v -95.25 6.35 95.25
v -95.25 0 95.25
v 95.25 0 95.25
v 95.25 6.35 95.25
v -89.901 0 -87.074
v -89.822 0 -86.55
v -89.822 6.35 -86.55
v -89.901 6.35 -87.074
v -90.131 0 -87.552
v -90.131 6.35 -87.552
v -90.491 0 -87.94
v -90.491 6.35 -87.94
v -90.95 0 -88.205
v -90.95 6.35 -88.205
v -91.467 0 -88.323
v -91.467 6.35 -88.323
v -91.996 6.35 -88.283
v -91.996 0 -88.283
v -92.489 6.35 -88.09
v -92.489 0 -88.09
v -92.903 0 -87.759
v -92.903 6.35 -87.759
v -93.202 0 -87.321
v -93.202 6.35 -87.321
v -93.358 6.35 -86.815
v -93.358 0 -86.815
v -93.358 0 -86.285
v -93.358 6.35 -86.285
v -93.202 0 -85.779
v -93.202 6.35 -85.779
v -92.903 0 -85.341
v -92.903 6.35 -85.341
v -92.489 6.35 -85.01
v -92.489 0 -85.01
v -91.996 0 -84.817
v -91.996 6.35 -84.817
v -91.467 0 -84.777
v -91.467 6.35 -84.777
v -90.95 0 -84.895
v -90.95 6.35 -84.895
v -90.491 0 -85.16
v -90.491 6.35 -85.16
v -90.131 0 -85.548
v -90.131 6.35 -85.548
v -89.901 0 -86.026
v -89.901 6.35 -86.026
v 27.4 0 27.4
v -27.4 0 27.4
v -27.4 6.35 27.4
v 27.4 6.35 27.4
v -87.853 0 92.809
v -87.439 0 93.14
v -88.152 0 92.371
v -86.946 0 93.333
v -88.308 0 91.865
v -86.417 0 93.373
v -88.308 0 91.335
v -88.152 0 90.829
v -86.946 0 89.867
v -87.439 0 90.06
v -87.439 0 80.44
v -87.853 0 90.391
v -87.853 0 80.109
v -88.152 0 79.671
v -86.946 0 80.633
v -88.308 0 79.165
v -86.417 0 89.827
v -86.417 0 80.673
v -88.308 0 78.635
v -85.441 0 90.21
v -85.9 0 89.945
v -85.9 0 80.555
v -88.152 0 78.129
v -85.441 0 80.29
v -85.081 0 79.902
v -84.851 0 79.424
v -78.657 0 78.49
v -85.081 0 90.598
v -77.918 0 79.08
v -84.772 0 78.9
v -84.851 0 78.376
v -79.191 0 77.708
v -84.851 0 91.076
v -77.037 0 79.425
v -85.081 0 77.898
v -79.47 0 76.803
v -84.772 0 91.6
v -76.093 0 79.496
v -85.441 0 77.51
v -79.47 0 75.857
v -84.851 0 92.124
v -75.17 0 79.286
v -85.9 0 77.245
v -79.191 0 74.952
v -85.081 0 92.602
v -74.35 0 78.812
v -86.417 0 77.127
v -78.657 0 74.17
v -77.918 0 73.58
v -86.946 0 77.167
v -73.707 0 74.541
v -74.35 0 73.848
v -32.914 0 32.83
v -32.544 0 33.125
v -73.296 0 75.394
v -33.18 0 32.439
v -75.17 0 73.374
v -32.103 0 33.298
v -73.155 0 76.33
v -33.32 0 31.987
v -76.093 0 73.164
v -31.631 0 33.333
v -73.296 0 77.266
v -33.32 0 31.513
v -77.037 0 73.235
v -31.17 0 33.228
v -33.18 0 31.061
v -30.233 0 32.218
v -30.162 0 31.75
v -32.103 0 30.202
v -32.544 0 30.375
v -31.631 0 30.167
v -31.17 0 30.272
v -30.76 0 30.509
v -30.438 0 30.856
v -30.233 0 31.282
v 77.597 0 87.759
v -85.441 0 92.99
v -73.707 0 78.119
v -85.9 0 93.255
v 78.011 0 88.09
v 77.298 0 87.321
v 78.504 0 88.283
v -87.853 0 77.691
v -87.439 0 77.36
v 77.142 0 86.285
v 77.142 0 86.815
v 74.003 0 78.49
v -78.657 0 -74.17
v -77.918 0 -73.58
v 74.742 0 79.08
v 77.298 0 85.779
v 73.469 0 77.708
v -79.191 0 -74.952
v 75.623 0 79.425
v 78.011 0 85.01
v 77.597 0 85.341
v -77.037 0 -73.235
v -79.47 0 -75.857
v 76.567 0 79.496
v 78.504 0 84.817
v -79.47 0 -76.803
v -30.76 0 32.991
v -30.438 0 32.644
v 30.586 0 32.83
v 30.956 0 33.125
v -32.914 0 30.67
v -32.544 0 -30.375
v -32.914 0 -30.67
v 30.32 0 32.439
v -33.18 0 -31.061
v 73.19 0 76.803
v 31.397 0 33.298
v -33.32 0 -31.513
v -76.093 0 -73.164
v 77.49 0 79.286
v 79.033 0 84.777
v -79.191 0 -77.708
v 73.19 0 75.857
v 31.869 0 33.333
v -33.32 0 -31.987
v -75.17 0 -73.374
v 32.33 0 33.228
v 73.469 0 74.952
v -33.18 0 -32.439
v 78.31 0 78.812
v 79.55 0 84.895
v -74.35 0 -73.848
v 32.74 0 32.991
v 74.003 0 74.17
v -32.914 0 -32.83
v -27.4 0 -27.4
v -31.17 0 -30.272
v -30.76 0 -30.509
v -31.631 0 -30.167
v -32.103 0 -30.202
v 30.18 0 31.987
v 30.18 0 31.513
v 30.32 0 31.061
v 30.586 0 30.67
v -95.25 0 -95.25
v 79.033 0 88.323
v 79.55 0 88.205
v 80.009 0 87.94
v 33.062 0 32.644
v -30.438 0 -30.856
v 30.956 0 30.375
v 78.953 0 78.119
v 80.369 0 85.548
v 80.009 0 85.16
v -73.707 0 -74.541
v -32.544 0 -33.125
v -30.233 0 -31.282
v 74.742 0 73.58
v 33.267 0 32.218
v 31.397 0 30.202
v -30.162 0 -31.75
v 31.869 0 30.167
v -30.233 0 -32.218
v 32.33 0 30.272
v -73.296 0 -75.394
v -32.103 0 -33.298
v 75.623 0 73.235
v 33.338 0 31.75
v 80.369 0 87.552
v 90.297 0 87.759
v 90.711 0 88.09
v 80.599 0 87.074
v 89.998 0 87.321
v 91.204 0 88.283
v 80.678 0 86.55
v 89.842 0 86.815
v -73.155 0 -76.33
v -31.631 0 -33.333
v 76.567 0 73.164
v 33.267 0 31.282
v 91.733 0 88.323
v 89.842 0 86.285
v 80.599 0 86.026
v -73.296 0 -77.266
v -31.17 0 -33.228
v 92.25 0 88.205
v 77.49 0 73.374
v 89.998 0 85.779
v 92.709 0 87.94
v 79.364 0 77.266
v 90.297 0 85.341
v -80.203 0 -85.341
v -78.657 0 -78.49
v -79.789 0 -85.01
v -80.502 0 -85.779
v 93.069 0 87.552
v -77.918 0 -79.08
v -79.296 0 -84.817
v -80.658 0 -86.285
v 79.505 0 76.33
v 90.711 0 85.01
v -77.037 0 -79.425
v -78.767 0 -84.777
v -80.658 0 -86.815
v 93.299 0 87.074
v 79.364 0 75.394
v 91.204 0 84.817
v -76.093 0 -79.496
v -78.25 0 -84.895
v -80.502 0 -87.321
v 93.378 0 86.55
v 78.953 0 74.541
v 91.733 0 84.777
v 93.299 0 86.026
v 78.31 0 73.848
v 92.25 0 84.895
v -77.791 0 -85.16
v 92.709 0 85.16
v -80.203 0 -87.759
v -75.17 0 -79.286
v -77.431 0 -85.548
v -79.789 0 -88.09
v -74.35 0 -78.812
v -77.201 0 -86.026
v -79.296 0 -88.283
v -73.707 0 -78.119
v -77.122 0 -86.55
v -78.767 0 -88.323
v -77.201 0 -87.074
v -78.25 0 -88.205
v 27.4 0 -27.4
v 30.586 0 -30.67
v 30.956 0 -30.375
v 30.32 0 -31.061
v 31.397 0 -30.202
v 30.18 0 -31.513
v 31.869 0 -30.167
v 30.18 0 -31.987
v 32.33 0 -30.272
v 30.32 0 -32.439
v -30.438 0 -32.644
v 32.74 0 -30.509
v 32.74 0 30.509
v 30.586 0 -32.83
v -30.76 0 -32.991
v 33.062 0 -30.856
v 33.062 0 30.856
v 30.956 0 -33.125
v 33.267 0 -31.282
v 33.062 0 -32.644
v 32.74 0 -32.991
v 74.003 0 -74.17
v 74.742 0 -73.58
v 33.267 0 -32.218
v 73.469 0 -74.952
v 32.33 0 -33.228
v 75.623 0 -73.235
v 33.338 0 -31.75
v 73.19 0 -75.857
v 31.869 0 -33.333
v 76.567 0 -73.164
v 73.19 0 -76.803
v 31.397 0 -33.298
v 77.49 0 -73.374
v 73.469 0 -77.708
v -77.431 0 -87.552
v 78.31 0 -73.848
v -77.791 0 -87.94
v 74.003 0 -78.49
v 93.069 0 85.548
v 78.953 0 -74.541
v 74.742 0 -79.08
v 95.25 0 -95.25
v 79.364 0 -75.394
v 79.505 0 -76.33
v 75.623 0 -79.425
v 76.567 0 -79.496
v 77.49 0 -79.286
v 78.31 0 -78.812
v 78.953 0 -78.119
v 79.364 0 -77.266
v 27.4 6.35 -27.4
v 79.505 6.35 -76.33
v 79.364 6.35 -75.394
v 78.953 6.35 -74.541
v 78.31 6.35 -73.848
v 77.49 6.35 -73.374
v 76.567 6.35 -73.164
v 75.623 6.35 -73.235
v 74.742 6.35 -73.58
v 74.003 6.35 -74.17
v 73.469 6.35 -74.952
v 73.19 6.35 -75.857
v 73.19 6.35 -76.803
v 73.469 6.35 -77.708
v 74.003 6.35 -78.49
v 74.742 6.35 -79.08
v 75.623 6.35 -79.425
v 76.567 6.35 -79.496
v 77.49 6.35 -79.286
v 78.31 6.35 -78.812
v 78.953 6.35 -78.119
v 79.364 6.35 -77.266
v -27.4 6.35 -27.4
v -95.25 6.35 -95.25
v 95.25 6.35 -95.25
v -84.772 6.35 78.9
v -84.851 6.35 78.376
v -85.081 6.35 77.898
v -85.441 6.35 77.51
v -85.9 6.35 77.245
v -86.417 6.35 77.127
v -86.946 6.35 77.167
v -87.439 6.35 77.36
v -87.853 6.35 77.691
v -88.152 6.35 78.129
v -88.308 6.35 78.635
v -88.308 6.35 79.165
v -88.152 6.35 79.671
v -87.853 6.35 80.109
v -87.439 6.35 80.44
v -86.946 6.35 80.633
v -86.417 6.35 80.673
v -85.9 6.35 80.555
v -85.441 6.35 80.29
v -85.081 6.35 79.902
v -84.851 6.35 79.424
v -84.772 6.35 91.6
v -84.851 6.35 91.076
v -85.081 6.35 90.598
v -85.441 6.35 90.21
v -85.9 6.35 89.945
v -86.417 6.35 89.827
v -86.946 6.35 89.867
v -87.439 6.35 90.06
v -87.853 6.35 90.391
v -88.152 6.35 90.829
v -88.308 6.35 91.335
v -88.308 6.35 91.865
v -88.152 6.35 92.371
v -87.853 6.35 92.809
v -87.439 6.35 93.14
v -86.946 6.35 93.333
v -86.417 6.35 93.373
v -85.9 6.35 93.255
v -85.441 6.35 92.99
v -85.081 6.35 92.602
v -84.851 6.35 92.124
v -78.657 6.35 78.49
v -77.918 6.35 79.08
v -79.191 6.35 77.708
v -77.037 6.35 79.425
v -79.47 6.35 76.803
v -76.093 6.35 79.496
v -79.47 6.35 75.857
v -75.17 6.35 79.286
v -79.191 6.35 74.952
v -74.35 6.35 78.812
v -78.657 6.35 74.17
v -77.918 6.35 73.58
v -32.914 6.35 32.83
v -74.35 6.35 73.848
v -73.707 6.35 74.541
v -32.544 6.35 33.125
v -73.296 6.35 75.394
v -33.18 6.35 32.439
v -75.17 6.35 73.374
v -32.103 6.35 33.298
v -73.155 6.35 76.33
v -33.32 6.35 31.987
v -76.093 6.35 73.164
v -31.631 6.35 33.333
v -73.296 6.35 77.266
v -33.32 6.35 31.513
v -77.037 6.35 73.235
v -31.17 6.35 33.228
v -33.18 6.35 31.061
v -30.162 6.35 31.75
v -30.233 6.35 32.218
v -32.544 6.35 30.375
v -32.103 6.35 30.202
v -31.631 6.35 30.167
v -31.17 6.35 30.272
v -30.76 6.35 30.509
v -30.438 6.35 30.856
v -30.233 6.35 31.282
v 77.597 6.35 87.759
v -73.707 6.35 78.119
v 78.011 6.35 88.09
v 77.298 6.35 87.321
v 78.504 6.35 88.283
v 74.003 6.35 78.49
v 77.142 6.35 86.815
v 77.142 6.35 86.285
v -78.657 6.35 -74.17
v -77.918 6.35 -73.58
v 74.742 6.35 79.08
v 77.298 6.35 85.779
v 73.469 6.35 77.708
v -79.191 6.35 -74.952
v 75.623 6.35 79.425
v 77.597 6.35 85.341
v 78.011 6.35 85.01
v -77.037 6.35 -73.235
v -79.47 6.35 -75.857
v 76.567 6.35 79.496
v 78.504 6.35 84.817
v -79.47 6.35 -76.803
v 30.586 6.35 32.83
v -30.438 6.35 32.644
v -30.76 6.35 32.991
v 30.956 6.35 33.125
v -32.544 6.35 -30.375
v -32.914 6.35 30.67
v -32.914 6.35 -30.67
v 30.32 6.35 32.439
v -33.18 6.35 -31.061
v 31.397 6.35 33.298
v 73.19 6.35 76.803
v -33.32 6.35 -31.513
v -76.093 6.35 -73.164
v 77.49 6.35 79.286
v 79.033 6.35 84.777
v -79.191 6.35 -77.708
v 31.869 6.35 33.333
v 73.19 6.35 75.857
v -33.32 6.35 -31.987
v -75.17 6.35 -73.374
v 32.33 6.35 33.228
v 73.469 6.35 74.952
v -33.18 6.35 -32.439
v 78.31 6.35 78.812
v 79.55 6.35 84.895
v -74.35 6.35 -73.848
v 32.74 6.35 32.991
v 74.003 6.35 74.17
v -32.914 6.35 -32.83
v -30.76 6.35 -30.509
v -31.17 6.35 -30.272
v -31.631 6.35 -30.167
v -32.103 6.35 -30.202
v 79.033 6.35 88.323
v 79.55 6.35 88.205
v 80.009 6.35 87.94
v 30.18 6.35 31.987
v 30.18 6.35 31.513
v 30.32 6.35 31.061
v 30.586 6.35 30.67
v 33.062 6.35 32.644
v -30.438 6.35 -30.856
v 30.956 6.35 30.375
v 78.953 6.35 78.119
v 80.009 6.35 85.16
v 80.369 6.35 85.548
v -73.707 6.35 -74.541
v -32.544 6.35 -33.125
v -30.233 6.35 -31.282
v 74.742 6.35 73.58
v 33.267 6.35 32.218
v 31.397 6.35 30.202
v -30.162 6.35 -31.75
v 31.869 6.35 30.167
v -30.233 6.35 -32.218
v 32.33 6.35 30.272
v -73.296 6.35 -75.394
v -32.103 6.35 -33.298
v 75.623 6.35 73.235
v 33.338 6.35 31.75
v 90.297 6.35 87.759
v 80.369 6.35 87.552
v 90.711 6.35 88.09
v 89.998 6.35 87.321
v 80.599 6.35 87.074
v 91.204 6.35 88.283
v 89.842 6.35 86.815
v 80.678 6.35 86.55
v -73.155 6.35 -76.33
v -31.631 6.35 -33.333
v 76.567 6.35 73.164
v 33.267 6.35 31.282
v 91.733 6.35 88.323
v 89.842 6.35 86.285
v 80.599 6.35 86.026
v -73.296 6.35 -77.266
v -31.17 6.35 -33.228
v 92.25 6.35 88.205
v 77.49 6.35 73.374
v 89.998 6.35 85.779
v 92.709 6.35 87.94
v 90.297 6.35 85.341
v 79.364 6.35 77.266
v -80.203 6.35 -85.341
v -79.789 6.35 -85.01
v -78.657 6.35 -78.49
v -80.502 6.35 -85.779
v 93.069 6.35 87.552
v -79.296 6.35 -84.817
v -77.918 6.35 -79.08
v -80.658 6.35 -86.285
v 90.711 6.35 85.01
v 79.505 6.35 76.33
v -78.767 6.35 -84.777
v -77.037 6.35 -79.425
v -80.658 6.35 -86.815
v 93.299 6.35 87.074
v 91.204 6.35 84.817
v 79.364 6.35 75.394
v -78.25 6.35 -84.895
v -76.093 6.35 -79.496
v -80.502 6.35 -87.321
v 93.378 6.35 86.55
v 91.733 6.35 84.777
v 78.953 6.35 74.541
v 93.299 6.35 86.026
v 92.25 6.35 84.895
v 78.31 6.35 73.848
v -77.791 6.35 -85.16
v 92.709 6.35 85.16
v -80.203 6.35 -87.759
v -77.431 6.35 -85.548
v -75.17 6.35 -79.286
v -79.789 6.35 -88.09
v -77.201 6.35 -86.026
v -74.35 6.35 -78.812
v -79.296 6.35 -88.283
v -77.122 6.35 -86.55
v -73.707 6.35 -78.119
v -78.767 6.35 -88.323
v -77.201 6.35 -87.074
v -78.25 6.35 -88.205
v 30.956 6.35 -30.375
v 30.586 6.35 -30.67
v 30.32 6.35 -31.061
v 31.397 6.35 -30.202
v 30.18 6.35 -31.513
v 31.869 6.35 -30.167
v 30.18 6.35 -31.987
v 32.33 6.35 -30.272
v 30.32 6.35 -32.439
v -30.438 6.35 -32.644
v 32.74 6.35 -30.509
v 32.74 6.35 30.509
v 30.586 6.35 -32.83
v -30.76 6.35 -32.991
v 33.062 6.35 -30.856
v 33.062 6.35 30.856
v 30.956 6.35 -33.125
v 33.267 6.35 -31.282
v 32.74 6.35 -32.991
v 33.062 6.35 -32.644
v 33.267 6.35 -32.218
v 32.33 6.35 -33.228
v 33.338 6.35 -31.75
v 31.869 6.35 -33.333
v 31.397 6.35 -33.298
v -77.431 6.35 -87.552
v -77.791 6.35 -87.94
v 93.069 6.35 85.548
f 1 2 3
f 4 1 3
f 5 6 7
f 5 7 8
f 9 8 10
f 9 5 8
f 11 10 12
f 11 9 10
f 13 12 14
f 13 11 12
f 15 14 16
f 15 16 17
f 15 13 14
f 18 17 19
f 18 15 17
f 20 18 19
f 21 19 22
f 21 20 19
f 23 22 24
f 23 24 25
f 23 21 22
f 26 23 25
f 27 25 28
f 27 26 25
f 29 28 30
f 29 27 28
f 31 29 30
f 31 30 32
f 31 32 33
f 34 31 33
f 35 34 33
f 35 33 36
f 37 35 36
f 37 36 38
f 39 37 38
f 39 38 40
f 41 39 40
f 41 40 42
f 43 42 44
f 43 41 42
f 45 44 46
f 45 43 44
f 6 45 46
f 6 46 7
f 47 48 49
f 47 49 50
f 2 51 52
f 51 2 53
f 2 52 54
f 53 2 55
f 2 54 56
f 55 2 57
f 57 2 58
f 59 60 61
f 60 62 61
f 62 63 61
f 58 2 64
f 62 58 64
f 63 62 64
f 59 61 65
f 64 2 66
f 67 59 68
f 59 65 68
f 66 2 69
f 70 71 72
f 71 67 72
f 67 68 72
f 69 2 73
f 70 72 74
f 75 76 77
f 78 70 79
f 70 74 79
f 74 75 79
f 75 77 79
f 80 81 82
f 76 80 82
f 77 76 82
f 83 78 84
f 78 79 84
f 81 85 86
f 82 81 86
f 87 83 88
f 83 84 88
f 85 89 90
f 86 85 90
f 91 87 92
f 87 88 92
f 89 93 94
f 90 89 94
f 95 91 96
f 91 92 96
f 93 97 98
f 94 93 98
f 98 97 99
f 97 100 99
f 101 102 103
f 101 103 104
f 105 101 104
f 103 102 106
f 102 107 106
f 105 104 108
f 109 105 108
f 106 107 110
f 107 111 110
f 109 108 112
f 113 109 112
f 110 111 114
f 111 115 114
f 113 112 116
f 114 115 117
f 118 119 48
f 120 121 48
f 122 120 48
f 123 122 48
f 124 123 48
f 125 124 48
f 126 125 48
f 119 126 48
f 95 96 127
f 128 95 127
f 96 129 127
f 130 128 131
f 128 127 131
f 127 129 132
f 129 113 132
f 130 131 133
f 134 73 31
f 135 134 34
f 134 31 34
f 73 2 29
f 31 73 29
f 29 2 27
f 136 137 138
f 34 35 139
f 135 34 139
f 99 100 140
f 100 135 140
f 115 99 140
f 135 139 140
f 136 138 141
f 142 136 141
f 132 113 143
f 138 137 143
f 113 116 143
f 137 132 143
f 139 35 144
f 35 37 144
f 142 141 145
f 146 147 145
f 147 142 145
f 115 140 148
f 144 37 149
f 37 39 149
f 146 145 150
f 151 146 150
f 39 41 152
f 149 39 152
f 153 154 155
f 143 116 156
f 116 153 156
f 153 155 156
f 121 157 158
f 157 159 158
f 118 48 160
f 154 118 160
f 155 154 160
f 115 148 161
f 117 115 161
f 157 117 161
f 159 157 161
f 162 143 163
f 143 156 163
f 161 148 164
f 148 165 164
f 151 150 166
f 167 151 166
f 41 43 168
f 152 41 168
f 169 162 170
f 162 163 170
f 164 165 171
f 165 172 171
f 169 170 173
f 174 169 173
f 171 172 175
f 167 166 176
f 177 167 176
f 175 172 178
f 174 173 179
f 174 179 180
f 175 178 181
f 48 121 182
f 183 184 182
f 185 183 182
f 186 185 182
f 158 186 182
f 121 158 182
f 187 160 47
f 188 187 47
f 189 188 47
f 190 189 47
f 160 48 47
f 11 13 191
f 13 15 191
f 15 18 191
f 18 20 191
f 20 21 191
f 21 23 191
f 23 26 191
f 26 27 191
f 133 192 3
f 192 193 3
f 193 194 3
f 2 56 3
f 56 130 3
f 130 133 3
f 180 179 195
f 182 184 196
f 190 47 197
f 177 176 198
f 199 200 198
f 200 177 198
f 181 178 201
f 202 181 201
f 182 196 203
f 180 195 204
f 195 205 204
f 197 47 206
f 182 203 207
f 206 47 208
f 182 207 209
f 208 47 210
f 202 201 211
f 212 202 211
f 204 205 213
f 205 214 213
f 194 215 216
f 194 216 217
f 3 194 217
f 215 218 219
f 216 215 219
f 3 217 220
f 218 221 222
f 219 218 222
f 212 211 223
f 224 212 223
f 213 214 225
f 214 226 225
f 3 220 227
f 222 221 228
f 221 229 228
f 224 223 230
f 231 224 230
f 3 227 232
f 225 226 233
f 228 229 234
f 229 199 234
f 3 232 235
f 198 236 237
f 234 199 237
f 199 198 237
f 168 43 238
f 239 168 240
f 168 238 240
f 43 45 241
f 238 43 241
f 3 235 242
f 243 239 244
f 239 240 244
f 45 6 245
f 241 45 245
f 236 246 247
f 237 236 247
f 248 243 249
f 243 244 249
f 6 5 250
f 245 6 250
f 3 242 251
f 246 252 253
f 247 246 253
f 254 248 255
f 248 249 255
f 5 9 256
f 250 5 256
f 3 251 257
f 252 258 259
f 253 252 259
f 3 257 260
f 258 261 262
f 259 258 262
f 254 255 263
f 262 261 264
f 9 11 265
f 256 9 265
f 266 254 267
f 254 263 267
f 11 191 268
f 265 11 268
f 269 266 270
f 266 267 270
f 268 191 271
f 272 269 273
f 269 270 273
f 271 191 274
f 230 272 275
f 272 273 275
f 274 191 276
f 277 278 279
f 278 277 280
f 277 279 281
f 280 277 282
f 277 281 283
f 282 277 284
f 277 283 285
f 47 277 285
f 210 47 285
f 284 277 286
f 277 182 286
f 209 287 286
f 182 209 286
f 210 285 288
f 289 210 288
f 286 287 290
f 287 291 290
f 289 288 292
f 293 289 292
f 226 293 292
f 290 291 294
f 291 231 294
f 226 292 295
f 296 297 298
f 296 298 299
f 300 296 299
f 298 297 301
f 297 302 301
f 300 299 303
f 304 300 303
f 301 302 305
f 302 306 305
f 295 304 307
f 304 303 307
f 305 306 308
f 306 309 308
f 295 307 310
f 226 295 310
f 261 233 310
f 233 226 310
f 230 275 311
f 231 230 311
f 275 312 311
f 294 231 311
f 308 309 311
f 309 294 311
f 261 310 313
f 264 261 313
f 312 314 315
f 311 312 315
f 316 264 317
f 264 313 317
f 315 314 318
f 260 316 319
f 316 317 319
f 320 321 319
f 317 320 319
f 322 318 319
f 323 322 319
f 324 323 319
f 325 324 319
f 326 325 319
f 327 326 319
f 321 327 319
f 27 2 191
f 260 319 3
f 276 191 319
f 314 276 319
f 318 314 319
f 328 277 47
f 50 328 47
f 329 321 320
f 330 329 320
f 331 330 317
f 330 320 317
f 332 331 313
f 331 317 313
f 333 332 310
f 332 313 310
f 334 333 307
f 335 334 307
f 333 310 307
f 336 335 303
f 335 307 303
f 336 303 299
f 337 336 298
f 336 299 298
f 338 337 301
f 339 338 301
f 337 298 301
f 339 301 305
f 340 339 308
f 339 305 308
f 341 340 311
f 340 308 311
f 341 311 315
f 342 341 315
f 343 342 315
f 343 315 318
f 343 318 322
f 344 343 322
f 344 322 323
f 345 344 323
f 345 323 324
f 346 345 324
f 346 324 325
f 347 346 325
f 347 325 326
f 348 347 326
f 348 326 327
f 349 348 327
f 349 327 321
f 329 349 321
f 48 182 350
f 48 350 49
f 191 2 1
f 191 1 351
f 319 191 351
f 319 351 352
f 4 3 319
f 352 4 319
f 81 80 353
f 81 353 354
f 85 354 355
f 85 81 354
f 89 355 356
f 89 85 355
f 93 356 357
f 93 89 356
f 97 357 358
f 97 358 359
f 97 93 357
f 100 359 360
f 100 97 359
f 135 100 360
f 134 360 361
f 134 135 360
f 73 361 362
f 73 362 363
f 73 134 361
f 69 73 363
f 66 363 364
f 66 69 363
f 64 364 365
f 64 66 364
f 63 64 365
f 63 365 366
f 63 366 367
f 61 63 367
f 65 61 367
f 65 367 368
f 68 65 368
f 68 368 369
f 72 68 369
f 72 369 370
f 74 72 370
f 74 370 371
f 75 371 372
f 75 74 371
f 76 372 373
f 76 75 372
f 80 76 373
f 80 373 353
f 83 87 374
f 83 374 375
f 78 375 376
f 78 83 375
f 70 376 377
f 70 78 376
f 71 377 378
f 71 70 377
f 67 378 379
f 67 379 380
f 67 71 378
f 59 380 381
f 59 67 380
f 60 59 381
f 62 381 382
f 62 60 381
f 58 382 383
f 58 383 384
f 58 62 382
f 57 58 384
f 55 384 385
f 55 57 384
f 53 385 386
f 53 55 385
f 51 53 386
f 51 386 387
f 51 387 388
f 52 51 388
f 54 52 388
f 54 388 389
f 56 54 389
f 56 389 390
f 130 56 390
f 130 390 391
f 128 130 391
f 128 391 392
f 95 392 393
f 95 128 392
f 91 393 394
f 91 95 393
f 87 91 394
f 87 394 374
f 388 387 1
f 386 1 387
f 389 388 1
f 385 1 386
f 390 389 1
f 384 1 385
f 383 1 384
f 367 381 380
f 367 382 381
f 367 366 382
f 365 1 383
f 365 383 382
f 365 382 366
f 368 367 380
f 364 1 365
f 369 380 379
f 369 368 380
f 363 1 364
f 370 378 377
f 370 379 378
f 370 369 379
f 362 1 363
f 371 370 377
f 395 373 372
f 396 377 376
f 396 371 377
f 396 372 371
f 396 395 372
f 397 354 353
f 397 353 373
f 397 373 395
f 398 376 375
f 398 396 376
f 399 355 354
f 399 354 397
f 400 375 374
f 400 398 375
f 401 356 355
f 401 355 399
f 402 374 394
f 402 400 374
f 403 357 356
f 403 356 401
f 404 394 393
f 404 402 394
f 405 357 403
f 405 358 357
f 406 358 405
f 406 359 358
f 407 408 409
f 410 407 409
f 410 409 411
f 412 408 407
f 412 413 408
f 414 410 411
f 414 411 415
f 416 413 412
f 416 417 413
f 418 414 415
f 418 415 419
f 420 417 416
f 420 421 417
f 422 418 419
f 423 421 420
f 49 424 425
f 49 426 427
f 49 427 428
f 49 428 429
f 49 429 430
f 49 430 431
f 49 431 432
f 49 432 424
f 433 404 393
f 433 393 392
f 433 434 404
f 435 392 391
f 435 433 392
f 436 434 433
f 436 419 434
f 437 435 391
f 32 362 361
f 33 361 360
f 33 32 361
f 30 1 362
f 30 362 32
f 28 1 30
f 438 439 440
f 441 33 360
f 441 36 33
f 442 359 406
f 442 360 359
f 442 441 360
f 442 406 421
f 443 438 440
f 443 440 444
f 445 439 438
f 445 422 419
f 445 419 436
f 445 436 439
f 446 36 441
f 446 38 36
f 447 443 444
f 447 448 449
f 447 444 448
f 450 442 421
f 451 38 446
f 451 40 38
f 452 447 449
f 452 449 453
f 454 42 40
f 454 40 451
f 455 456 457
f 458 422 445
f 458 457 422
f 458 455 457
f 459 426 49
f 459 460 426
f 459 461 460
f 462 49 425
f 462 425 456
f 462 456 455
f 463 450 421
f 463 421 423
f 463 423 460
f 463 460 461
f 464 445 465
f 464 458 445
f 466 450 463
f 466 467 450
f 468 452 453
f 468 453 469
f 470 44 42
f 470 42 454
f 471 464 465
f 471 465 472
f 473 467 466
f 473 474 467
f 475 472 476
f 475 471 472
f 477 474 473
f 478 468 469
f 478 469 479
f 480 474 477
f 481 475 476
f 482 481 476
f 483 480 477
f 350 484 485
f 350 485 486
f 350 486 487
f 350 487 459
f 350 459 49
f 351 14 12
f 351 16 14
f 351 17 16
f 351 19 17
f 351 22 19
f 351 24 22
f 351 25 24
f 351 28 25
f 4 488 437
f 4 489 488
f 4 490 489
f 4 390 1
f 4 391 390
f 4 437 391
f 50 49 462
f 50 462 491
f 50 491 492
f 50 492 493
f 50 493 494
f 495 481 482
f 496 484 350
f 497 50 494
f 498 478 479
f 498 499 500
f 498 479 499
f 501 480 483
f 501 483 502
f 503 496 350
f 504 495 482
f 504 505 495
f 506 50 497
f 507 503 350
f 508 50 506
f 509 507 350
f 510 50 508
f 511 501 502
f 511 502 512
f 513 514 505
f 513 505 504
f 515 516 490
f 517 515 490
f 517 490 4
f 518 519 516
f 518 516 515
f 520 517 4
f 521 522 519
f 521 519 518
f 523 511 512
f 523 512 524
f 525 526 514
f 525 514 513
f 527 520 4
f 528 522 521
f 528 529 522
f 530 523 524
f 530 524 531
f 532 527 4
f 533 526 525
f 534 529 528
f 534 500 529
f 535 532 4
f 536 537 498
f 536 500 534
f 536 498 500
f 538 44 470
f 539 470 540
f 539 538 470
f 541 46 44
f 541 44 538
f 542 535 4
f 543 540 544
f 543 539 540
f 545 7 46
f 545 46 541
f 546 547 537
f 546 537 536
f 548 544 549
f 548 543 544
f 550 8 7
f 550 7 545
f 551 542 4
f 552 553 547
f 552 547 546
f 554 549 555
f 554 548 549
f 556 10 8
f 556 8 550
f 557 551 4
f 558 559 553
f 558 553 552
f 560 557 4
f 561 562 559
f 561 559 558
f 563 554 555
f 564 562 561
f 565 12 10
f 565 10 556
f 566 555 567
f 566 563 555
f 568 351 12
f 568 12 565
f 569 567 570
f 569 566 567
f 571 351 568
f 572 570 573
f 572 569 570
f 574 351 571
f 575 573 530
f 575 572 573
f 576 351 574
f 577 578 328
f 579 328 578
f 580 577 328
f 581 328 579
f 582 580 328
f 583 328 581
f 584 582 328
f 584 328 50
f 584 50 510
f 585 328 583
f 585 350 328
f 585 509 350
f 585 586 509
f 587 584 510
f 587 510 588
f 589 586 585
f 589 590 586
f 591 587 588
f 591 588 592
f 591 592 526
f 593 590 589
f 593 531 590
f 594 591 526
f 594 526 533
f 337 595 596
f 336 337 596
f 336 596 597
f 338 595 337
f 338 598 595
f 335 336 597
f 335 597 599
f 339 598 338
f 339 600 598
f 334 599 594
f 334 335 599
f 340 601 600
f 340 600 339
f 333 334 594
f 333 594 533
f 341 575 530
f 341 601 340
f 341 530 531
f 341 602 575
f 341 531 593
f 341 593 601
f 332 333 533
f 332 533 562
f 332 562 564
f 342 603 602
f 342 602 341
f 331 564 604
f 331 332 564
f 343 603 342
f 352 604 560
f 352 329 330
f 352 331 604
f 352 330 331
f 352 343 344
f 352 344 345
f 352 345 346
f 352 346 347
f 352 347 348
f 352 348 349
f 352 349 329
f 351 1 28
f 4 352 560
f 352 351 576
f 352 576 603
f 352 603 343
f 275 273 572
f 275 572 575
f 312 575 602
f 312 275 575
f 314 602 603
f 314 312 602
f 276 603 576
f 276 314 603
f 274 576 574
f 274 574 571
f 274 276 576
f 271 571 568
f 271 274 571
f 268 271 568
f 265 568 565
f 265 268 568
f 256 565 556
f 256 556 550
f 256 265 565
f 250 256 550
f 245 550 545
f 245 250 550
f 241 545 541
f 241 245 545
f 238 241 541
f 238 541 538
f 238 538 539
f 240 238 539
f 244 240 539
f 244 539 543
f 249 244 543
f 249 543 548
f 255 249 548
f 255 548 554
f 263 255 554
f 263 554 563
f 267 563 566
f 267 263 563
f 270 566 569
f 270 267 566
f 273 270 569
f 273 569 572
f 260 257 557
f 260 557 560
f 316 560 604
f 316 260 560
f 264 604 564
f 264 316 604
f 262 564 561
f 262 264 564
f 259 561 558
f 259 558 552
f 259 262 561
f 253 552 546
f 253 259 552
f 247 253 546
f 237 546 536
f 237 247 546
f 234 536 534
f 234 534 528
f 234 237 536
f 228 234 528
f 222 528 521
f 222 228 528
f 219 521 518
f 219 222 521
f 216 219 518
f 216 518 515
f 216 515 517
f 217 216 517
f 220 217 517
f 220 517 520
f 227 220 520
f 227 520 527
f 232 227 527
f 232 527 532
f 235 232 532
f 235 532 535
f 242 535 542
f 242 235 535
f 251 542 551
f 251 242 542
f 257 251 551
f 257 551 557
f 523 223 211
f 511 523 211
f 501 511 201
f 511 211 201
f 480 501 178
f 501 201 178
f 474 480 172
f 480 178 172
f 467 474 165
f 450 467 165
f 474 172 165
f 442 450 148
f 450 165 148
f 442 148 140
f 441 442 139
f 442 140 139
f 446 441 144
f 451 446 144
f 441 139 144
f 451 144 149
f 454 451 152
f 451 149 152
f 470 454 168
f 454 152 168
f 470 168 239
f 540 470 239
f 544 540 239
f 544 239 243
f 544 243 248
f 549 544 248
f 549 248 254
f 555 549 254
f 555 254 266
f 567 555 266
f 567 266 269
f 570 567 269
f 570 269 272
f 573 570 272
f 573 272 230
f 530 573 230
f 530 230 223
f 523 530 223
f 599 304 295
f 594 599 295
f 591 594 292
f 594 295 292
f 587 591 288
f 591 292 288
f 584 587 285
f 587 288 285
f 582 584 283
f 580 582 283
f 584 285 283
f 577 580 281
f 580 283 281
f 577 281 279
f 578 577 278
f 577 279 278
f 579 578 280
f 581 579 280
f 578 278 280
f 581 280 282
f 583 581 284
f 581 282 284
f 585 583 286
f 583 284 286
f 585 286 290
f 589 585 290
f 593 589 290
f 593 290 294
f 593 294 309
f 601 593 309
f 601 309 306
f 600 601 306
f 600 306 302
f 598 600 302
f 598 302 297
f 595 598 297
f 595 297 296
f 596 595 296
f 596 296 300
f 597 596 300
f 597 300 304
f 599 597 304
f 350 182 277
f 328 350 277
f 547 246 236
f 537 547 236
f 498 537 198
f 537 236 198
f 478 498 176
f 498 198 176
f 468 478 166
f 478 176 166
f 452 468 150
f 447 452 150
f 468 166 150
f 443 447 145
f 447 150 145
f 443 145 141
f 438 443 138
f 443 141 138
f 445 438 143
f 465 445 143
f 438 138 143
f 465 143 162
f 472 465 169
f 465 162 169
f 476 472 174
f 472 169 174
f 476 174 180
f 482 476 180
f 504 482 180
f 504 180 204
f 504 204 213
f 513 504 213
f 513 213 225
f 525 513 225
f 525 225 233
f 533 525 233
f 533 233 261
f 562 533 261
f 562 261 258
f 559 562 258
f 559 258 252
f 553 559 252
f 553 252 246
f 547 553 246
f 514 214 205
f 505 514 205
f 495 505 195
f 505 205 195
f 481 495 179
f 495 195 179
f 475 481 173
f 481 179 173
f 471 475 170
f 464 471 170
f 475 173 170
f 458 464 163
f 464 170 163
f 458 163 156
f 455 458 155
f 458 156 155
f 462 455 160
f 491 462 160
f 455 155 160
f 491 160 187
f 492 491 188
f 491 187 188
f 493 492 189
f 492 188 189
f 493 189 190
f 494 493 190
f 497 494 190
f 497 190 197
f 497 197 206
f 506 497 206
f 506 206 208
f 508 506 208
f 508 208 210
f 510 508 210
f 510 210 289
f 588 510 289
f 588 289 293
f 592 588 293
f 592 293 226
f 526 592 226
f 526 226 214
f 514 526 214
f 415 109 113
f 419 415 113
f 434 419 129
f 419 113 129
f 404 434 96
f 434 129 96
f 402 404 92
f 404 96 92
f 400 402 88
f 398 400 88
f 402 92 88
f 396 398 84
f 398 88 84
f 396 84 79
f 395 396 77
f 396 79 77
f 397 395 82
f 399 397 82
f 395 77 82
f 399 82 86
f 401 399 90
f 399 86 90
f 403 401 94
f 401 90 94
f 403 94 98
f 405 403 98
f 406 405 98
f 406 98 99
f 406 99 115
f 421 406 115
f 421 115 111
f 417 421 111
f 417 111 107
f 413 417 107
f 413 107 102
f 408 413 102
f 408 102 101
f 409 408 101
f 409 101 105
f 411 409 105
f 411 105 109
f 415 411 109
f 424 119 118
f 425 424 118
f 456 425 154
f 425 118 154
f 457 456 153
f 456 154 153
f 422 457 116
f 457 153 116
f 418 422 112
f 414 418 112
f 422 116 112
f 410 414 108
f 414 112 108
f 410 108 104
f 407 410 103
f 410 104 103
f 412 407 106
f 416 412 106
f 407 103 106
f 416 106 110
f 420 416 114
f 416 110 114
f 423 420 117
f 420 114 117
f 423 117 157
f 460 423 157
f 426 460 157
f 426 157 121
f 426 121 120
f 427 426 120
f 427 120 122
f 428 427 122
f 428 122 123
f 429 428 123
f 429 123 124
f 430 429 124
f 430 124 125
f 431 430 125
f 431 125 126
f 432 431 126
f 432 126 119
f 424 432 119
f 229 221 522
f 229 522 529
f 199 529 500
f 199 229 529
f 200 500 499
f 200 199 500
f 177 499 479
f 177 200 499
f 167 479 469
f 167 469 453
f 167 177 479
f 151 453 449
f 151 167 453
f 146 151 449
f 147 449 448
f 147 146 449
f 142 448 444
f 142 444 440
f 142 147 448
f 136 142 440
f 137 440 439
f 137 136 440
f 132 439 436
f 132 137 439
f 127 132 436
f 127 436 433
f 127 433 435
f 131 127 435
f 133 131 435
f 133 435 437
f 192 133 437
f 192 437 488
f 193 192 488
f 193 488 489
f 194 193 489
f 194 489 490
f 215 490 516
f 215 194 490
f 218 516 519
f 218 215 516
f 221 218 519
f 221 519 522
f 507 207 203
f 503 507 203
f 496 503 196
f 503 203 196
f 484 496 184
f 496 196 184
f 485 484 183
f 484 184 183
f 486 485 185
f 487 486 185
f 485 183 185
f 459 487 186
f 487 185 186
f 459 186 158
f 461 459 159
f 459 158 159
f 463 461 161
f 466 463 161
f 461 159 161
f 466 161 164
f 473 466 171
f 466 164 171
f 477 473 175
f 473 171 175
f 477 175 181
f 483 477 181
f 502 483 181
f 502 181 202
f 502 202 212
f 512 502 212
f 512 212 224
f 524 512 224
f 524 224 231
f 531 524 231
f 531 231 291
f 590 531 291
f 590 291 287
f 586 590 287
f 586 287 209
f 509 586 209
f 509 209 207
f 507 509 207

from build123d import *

# Parameters (mm, degrees)
SKETCH1_W           = 190.5
SKETCH1_H           = 190.5
SKETCH1_R           = 1.905
SKETCH1_R_2         = 1.778
BOSS_EXTRUDE1_DEPTH = 6.35
SKETCH2_W           = 54.8
SKETCH2_H           = 54.8
CUT_EXTRUDE4_DEPTH  = 10
SKETCH4_R           = 1.5875
CUT_EXTRUDE5_DEPTH  = 10
SKETCH5_R           = 3.175
CUT_EXTRUDE6_DEPTH  = 7.35


with BuildPart() as part:
    # Sketch1 → Boss-Extrude1 (new body)
    with BuildSketch(Plane(origin=(0, 0, 0), x_dir=(1, 0, 0), z_dir=(0, 1, 0))):
        Rectangle(SKETCH1_W, SKETCH1_H)
        with Locations((-11.303, 11.303)):
            Circle(SKETCH1_R, mode=Mode.SUBTRACT)
        with Locations((-11.303, -11.303)):
            Circle(SKETCH1_R, mode=Mode.SUBTRACT)
        with Locations((11.303, 11.303)):
            Circle(SKETCH1_R, mode=Mode.SUBTRACT)
        with Locations((11.303, -11.303)):
            Circle(SKETCH1_R, mode=Mode.SUBTRACT)
        with Locations((-78.9, 86.55)):
            Circle(SKETCH1_R_2, mode=Mode.SUBTRACT)
        with Locations((-91.6, 86.55)):
            Circle(SKETCH1_R_2, mode=Mode.SUBTRACT)
        with Locations((91.6, -86.55)):
            Circle(SKETCH1_R_2, mode=Mode.SUBTRACT)
        with Locations((78.9, -86.55)):
            Circle(SKETCH1_R_2, mode=Mode.SUBTRACT)
        with Locations((-86.55, -78.9)):
            Circle(SKETCH1_R_2, mode=Mode.SUBTRACT)
        with Locations((-86.55, -91.6)):
            Circle(SKETCH1_R_2, mode=Mode.SUBTRACT)
    extrude(amount=BOSS_EXTRUDE1_DEPTH)

    # Sketch2 → Cut-Extrude4 (cut)
    with BuildSketch(Plane.XZ):
        Rectangle(SKETCH2_W, SKETCH2_H)
    extrude(amount=-CUT_EXTRUDE4_DEPTH, mode=Mode.SUBTRACT)

    # Sketch4 → Cut-Extrude5 (cut)
    with BuildSketch(Plane.XZ):
        with Locations((-31.75, 31.75)):
            Circle(SKETCH4_R)
        with Locations((31.75, 31.75)):
            Circle(SKETCH4_R)
        with Locations((31.75, -31.75)):
            Circle(SKETCH4_R)
        with Locations((-31.75, -31.75)):
            Circle(SKETCH4_R)
    extrude(amount=-CUT_EXTRUDE5_DEPTH, mode=Mode.SUBTRACT)

    # Sketch5 → Cut-Extrude6 (cut, through all)
    with BuildSketch(Plane.XZ):
        with Locations((76.33, -76.33)):
            Circle(SKETCH5_R)
        with Locations((76.33, 76.33)):
            Circle(SKETCH5_R)
        with Locations((-76.33, -76.33)):
            Circle(SKETCH5_R)
        with Locations((-76.33, 76.33)):
            Circle(SKETCH5_R)
    extrude(amount=-CUT_EXTRUDE6_DEPTH, mode=Mode.SUBTRACT)


solid = part.part
